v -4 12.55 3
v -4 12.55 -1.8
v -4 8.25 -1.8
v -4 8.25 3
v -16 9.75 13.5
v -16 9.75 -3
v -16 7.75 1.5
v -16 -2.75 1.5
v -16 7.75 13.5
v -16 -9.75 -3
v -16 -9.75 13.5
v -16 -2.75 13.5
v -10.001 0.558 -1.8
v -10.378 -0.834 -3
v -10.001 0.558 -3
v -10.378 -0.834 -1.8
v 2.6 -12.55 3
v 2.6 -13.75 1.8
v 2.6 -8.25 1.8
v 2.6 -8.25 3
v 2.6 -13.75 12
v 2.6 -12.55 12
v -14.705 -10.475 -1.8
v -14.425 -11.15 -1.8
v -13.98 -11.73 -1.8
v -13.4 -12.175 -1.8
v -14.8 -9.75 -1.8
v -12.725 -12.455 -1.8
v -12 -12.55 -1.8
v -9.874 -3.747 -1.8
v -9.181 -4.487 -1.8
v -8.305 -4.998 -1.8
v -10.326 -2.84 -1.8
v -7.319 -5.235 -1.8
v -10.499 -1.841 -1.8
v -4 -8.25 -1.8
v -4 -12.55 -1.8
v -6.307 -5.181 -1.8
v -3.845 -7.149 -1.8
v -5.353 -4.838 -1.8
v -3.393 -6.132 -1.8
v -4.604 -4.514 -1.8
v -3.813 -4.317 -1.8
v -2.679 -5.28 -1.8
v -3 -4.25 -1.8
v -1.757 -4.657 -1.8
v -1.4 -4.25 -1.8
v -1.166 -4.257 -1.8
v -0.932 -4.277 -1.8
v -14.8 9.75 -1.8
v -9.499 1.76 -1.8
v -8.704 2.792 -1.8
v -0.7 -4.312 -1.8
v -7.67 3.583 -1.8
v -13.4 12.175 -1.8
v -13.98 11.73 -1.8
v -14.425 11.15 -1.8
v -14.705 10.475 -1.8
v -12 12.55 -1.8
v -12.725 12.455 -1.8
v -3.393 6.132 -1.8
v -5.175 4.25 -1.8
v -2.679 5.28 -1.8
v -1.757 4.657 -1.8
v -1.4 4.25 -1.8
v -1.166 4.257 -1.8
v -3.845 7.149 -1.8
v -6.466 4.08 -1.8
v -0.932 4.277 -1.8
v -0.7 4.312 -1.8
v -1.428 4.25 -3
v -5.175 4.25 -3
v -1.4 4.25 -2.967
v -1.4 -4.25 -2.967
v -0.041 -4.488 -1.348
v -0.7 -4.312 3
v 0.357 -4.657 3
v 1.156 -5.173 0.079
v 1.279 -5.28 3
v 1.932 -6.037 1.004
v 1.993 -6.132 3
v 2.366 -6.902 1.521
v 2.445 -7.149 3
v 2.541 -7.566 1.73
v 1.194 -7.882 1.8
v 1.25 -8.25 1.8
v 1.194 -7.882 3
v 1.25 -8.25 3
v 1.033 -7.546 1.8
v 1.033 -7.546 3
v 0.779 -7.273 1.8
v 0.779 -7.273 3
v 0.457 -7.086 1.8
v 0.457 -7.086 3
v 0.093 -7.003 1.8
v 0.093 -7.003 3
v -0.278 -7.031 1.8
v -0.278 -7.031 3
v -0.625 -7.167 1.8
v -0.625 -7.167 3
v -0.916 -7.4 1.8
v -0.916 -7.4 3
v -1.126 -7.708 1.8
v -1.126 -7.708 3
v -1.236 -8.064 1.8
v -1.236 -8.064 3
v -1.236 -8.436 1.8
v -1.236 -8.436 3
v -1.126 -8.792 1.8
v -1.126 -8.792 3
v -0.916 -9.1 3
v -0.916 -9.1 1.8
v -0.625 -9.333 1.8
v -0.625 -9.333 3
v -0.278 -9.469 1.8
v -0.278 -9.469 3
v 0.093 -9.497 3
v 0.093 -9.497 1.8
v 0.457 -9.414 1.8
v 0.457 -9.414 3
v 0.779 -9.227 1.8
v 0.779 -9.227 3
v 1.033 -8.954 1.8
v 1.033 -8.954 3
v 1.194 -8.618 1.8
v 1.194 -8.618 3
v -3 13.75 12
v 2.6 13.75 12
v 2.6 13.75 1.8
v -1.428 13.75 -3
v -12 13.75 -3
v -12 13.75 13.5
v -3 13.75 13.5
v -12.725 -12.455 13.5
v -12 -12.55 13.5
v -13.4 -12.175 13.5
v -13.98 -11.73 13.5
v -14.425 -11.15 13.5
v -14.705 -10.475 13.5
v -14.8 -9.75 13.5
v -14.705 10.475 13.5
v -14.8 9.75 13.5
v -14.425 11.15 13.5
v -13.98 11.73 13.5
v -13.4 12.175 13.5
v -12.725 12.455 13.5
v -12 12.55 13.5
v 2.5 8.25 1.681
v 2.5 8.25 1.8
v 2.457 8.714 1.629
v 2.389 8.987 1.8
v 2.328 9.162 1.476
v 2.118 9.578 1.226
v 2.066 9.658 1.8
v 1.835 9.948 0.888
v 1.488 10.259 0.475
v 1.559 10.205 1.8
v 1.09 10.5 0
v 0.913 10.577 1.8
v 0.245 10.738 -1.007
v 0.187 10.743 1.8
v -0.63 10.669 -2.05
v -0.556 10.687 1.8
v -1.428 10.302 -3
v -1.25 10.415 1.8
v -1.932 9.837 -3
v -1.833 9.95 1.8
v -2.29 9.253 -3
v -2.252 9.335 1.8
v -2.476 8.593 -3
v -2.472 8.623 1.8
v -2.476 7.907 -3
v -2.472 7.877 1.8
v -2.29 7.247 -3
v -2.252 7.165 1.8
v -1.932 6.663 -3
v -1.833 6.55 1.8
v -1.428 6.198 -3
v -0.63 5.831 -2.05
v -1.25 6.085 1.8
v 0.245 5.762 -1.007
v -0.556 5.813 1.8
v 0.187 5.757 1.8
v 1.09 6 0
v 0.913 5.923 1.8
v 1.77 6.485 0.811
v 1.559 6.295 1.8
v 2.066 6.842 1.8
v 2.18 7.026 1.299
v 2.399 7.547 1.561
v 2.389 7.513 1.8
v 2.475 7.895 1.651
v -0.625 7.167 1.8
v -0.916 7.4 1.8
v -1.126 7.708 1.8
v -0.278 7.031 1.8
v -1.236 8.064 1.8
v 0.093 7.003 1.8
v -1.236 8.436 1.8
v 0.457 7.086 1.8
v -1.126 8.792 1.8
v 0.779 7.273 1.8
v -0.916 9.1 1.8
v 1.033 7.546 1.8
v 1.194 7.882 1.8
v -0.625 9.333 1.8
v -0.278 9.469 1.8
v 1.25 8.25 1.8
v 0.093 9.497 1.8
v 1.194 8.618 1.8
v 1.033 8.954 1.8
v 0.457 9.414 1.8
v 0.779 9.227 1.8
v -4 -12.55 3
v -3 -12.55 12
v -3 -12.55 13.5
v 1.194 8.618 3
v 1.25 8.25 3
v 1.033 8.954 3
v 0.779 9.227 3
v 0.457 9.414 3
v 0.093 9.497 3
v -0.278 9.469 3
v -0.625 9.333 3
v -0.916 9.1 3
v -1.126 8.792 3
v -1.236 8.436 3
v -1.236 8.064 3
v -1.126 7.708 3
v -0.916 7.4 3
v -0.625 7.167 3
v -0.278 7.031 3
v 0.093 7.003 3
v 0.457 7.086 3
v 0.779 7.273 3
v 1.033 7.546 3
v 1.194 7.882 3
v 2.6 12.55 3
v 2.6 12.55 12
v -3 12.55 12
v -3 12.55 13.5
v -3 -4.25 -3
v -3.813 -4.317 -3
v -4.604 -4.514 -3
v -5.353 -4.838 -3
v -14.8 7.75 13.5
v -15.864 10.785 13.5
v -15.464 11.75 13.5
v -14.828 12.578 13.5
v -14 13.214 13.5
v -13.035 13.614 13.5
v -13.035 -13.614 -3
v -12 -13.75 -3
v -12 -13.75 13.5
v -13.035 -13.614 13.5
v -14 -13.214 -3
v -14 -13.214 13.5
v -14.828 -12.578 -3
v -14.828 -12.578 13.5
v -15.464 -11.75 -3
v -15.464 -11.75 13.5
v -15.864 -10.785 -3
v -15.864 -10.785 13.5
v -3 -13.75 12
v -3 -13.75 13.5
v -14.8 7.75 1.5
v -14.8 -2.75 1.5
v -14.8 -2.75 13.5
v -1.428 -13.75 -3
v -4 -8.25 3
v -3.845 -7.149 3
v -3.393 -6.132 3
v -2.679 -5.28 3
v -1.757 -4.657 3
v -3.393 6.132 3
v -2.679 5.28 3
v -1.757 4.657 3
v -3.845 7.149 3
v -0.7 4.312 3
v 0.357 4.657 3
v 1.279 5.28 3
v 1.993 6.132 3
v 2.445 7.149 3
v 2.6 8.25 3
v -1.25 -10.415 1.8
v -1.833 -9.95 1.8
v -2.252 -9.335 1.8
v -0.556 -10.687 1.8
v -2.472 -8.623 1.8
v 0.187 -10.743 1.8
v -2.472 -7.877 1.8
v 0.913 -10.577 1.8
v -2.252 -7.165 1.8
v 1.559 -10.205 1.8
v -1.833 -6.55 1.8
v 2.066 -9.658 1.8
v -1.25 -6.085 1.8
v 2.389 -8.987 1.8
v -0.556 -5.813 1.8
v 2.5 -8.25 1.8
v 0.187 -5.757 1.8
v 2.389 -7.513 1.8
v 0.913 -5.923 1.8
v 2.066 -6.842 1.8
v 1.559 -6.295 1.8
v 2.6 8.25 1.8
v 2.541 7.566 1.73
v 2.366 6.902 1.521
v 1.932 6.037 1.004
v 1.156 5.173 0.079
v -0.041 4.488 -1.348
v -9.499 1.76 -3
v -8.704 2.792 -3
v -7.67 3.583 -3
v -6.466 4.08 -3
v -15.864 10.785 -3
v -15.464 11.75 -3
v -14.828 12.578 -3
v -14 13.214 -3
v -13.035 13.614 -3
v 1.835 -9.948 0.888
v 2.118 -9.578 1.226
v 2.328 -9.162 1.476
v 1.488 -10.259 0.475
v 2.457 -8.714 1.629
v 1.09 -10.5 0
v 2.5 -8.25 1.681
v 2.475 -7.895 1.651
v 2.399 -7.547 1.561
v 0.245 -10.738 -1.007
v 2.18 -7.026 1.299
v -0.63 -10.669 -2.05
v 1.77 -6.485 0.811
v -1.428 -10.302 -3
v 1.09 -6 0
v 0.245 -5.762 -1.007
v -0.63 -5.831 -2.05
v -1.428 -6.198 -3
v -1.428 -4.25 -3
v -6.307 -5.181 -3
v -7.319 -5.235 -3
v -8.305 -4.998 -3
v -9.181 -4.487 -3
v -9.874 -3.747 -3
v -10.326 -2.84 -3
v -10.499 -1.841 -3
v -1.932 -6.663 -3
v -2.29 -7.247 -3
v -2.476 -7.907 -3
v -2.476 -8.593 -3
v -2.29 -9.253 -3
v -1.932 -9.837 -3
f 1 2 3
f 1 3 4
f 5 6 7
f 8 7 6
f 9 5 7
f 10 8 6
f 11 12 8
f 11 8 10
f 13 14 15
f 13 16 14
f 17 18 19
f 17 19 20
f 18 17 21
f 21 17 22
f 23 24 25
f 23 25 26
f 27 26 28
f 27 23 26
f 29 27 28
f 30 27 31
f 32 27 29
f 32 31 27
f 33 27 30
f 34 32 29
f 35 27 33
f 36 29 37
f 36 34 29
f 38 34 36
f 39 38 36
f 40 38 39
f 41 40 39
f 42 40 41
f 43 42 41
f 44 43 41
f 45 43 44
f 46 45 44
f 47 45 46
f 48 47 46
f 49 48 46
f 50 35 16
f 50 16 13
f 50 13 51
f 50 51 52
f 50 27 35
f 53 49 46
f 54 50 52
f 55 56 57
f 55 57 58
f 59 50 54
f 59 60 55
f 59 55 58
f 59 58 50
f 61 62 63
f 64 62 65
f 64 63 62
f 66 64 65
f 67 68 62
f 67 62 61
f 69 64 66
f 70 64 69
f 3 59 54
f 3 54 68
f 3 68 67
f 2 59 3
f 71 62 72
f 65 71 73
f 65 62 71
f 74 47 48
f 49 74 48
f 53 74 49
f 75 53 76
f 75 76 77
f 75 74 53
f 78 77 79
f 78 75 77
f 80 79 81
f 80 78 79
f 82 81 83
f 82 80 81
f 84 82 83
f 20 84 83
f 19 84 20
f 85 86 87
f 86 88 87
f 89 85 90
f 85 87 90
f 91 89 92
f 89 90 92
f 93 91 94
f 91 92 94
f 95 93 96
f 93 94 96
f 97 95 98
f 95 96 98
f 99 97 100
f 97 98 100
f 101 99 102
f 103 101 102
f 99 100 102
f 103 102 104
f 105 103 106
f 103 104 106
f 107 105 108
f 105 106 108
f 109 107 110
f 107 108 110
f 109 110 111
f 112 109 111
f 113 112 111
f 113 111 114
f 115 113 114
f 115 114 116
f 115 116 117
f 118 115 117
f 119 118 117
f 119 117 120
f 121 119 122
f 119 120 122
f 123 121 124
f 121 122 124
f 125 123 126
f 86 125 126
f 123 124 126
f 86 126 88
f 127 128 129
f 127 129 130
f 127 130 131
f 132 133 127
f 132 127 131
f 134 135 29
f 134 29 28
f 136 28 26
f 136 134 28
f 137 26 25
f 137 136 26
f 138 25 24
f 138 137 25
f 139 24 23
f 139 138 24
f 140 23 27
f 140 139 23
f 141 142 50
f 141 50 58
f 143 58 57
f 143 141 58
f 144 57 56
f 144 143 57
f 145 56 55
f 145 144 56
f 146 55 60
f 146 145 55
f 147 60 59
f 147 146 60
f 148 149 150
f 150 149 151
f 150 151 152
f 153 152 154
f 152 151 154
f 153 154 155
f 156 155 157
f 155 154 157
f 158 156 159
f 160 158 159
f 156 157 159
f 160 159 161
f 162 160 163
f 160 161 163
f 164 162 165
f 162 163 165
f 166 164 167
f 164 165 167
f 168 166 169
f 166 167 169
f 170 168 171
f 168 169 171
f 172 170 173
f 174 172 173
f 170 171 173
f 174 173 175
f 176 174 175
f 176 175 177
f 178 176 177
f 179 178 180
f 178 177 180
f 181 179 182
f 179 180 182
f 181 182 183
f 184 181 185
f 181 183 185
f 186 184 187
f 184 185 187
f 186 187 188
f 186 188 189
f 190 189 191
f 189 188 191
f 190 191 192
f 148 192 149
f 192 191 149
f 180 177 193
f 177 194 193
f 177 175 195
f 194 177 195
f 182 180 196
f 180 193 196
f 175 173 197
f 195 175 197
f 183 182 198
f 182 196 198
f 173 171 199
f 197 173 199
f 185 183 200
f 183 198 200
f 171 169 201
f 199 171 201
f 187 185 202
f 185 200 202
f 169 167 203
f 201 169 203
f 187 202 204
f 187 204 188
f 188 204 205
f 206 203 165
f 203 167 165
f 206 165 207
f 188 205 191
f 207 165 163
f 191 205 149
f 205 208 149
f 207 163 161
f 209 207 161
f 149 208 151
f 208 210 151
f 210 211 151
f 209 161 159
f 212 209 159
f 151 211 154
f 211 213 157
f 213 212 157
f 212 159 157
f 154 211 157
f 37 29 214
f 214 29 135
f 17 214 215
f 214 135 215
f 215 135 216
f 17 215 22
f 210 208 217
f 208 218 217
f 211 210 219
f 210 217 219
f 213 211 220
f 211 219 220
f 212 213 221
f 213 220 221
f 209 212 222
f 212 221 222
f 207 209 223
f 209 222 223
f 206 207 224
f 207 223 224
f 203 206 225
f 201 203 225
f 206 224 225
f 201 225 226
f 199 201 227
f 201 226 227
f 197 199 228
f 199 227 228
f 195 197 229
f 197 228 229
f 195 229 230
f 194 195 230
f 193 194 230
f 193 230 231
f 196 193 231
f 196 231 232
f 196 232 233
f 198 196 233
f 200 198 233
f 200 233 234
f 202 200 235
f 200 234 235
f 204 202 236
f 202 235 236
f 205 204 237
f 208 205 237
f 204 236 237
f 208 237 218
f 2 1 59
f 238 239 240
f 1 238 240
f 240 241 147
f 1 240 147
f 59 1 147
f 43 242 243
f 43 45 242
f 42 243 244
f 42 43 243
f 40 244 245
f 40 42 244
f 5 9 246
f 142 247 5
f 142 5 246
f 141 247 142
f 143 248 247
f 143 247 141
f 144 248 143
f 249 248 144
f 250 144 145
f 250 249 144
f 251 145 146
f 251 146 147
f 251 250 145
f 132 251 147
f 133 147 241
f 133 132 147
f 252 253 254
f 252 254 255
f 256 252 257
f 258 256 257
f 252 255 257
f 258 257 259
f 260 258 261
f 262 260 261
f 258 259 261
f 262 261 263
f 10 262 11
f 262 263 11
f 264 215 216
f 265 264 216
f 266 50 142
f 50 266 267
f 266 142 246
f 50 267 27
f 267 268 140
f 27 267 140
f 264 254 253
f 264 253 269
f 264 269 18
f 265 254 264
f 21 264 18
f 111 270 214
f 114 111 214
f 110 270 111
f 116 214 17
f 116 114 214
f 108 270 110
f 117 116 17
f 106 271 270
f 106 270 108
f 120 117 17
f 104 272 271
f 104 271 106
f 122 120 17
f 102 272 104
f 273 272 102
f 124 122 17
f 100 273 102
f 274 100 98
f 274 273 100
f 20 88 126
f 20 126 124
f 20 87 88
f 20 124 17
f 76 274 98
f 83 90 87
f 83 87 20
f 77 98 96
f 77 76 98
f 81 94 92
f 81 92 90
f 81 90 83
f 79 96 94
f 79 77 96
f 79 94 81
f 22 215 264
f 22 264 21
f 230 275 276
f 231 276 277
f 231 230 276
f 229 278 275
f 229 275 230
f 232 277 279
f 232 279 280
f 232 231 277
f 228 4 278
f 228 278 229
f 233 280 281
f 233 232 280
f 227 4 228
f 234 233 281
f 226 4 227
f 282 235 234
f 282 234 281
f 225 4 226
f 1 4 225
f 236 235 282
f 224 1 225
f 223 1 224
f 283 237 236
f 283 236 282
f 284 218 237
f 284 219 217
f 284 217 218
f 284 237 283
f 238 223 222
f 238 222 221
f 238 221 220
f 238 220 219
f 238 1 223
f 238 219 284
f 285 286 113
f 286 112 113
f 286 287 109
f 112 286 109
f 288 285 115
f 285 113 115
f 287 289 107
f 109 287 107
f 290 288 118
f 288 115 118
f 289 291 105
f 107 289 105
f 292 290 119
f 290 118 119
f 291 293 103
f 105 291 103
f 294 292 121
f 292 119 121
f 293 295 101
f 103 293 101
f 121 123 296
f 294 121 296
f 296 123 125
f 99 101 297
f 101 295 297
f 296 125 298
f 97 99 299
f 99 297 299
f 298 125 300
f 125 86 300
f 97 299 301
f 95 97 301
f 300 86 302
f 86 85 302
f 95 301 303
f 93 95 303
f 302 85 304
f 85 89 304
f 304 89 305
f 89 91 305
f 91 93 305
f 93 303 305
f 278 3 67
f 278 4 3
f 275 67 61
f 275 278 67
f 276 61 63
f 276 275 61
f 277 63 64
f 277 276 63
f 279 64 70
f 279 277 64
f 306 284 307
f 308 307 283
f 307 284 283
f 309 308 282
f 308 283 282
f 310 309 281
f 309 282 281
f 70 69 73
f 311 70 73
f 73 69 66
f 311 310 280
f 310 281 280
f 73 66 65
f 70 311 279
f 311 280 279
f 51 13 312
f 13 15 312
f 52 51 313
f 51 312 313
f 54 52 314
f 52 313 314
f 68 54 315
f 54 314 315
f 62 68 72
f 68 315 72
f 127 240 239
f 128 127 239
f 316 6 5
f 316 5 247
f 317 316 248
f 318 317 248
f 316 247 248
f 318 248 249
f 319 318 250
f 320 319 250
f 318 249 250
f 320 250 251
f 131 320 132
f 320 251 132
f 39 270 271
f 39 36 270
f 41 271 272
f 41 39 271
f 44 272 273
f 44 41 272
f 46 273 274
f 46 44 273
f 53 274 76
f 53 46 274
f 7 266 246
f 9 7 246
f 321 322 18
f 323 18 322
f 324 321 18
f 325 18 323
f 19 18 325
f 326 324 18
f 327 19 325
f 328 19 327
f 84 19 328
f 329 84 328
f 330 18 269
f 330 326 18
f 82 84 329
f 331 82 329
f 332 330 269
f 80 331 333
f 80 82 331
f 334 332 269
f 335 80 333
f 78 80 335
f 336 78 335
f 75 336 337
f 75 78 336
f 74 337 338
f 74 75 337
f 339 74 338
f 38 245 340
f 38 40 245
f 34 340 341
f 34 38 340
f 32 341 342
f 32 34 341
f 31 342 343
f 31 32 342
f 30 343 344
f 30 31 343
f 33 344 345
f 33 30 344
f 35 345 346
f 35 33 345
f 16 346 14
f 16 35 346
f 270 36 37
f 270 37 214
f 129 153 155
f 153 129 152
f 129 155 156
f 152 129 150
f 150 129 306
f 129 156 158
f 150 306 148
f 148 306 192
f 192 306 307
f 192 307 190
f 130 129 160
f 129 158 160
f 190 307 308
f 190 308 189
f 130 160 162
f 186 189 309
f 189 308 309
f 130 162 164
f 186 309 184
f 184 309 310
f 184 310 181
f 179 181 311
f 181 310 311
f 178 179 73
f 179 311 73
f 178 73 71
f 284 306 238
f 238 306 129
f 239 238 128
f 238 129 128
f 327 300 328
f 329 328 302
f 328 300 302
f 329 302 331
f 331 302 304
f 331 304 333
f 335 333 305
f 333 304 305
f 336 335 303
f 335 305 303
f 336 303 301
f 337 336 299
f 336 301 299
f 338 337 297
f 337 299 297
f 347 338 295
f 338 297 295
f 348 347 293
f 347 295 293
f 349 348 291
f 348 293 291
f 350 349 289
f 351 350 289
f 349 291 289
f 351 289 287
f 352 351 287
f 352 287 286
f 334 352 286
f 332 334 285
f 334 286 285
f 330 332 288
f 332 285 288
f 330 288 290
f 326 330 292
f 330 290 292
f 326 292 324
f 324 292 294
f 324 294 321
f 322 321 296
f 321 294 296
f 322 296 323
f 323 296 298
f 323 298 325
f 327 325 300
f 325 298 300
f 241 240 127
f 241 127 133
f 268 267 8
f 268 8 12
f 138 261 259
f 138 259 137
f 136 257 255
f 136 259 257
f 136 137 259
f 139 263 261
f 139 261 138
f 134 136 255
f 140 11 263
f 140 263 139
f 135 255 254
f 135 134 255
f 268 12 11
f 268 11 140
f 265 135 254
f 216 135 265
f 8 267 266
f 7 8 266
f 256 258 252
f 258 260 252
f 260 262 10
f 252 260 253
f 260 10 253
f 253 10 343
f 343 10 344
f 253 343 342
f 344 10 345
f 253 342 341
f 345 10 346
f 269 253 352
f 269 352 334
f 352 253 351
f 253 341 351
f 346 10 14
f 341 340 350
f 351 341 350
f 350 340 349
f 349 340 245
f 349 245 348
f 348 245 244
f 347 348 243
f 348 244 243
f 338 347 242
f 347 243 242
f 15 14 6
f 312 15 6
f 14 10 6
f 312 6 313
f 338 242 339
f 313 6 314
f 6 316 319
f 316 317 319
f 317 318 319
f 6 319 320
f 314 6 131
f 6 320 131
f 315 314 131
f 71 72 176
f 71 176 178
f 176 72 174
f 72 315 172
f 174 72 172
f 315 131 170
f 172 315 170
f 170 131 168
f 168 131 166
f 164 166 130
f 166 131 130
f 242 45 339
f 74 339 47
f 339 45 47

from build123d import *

# Parameters (mm, degrees)
F4_DEPTH       = 13.5
F4_DEPTH_BACK  = 3
F5_R           = 4
F6_T           = -1.2
F7_W           = 6.6
F7_H           = 6
F8_DEPTH       = 13.75
F8_DEPTH_BACK  = 13.75
F3_W           = 8
F3_H           = 8.5
F9_DEPTH       = 4.5
F9_DEPTH_BACK  = 4.3
F11_START      = -6.5
F10_W          = 10.5
F10_H          = 18.4398862173
F11_DEPTH      = 11.4
F12_F1_R       = 4
F12_F2_R       = 4
F12_F3_R       = 4
F12_F4_R       = 4
F0_R           = 1.25
F13_DEPTH      = 7.9
F13_DEPTH_BACK = 7.1
F1_R           = 2.5
F14_DEPTH      = 1.8
F14_DEPTH_BACK = 4.3
F15_R          = 5
F17_DEPTH      = 16
F17_DEPTH_BACK = 16.1
F18_W          = 5.6
F18_H          = 3
F19_DEPTH      = 25
F19_DEPTH_BACK = 25


# Not quite as in the source:
# - a feature names something its author has since deleted; it is built from what else it names


with BuildPart() as f4:
    # F2 (on Top) → F4 (new body, two sides)
    with BuildSketch(Plane.XY) as f4_sk:
        with BuildLine():
            Line((2.6, 4.25), (2.6, 13.75))
            Line((2.6, 13.75), (-16, 13.75))
            Line((-16, 13.75), (-16, -13.75))
            Line((-16, -13.75), (2.6, -13.75))
            Line((2.6, -13.75), (2.6, -4.25))
            Line((2.6, -4.25), (-4.5505102572, -4.25))
            ThreePointArc((-4.5505102572, -4.25), (-8.769806787, -4.7695668459), (-10.3781091101, -0.8343697034))
            Line((-10.3781091101, -0.8343697034), (-9, 4.25))
            Line((-9, 4.25), (2.6, 4.25))
        make_face()
    extrude(amount=F4_DEPTH)
    extrude(f4_sk.sketch, amount=-F4_DEPTH_BACK)

    # F5
    f5_edges = [f4.edges().sort_by_distance(p)[0] for p in [
        (-16, 13.75, 5.25),
        (-16, -13.75, 5.25),
    ]]
    fillet(f5_edges, radius=F5_R)

    # F6
    f6_openings = [f4.faces().sort_by_distance(p)[0] for p in [
        (-4.7, 13.418005, 13.5),
        (2.6, 9, 5.25),
        (2.6, -9, 5.25),
        (-0.975255, -4.25, 5.25),
        (-3.2, 4.25, 5.25),
        (-8.769807, -4.769567, 5.25),
        (-9.689055, 1.707815, 5.25),
    ]]
    offset(amount=F6_T, openings=f6_openings)

    # F7 (on Front) → F8 (join, two sides)
    with BuildSketch(Plane.XZ) as f8_sk:
        with Locations((-0.7, 0)):
            Rectangle(F7_W, F7_H)
    extrude(amount=-F8_DEPTH)
    extrude(f8_sk.sketch, amount=F8_DEPTH_BACK)

    # F3 (on Top) → F9 (cut, two sides)
    with BuildSketch(Plane.XY) as f9_sk:
        with Locations((-1.4, 0)):
            Rectangle(F3_W, F3_H)
    extrude(amount=F9_DEPTH, mode=Mode.SUBTRACT)
    extrude(f9_sk.sketch, amount=-F9_DEPTH_BACK, mode=Mode.SUBTRACT)

    # F10 (on Right) → F11 (cut)
    with BuildSketch(Plane.YZ.offset(F11_START)):
        with Locations((2.5, 10.7199431086)):
            Rectangle(F10_W, F10_H)
    extrude(amount=-F11_DEPTH, mode=Mode.SUBTRACT)

    # F12: fillet of radius 4 on 4 edges, made by hand

    # F12_f1
    f12_f1_edges = [f4.edges().sort_by_distance(p)[0] for p in [
        (-4, -4.25, 0.6),
    ]]
    fillet(f12_f1_edges, radius=F12_F1_R)

    # F12_f2
    f12_f2_edges = [f4.edges().sort_by_distance(p)[0] for p in [
        (-4, 4.25, 0.6),
    ]]
    fillet(f12_f2_edges, radius=F12_F2_R)

    # F12_f3
    f12_f3_edges = [f4.edges().sort_by_distance(p)[0] for p in [
        (2.6, 4.25, 0),
    ]]
    fillet(f12_f3_edges, radius=F12_F3_R)

    # F12_f4
    f12_f4_edges = [f4.edges().sort_by_distance(p)[0] for p in [
        (2.6, -4.25, 0),
    ]]
    fillet(f12_f4_edges, radius=F12_F4_R)

    # F0 (on Top) → F13 (cut, two sides)
    with BuildSketch(Plane.XY) as f13_sk:
        with Locations((0, -8.25)):
            Circle(F0_R)
        with Locations((0, 8.25)):
            Circle(F0_R)
    extrude(amount=F13_DEPTH, mode=Mode.SUBTRACT)
    extrude(f13_sk.sketch, amount=-F13_DEPTH_BACK, mode=Mode.SUBTRACT)

    # F1 (on Top) → F14 (cut, two sides)
    with BuildSketch(Plane.XY) as f14_sk:
        with Locations((0, -8.25)):
            Circle(F1_R)
        with Locations((0, 8.25)):
            Circle(F1_R)
    extrude(amount=F14_DEPTH, mode=Mode.SUBTRACT)
    extrude(f14_sk.sketch, amount=-F14_DEPTH_BACK, mode=Mode.SUBTRACT)

    # F15
    f15_edges = [f4.edges().sort_by_distance(p)[0] for p in [
        (-4.55051, -4.25, -2.4),
        (-9, 4.25, -2.4),
    ]]
    fillet(f15_edges, radius=F15_R)

    # F16 (on Front) → F17 (cut, two sides)
    with BuildSketch(Plane.XZ) as f17_sk:
        Polygon((2.6, 1.8), (-4.0077234488, -6.074778159), (2.3954068281, -10.9375437775), (8.7053719483, -6.2603745918), align=None)
    extrude(amount=F17_DEPTH, mode=Mode.SUBTRACT)
    extrude(f17_sk.sketch, amount=-F17_DEPTH_BACK, mode=Mode.SUBTRACT)

    # F18 (on Front) → F19 (cut, two sides)
    with BuildSketch(Plane.XZ) as f19_sk:
        with Locations((-0.2, 13.5)):
            Rectangle(F18_W, F18_H)
    extrude(amount=F19_DEPTH, mode=Mode.SUBTRACT)
    extrude(f19_sk.sketch, amount=-F19_DEPTH_BACK, mode=Mode.SUBTRACT)


solid = f4.part
